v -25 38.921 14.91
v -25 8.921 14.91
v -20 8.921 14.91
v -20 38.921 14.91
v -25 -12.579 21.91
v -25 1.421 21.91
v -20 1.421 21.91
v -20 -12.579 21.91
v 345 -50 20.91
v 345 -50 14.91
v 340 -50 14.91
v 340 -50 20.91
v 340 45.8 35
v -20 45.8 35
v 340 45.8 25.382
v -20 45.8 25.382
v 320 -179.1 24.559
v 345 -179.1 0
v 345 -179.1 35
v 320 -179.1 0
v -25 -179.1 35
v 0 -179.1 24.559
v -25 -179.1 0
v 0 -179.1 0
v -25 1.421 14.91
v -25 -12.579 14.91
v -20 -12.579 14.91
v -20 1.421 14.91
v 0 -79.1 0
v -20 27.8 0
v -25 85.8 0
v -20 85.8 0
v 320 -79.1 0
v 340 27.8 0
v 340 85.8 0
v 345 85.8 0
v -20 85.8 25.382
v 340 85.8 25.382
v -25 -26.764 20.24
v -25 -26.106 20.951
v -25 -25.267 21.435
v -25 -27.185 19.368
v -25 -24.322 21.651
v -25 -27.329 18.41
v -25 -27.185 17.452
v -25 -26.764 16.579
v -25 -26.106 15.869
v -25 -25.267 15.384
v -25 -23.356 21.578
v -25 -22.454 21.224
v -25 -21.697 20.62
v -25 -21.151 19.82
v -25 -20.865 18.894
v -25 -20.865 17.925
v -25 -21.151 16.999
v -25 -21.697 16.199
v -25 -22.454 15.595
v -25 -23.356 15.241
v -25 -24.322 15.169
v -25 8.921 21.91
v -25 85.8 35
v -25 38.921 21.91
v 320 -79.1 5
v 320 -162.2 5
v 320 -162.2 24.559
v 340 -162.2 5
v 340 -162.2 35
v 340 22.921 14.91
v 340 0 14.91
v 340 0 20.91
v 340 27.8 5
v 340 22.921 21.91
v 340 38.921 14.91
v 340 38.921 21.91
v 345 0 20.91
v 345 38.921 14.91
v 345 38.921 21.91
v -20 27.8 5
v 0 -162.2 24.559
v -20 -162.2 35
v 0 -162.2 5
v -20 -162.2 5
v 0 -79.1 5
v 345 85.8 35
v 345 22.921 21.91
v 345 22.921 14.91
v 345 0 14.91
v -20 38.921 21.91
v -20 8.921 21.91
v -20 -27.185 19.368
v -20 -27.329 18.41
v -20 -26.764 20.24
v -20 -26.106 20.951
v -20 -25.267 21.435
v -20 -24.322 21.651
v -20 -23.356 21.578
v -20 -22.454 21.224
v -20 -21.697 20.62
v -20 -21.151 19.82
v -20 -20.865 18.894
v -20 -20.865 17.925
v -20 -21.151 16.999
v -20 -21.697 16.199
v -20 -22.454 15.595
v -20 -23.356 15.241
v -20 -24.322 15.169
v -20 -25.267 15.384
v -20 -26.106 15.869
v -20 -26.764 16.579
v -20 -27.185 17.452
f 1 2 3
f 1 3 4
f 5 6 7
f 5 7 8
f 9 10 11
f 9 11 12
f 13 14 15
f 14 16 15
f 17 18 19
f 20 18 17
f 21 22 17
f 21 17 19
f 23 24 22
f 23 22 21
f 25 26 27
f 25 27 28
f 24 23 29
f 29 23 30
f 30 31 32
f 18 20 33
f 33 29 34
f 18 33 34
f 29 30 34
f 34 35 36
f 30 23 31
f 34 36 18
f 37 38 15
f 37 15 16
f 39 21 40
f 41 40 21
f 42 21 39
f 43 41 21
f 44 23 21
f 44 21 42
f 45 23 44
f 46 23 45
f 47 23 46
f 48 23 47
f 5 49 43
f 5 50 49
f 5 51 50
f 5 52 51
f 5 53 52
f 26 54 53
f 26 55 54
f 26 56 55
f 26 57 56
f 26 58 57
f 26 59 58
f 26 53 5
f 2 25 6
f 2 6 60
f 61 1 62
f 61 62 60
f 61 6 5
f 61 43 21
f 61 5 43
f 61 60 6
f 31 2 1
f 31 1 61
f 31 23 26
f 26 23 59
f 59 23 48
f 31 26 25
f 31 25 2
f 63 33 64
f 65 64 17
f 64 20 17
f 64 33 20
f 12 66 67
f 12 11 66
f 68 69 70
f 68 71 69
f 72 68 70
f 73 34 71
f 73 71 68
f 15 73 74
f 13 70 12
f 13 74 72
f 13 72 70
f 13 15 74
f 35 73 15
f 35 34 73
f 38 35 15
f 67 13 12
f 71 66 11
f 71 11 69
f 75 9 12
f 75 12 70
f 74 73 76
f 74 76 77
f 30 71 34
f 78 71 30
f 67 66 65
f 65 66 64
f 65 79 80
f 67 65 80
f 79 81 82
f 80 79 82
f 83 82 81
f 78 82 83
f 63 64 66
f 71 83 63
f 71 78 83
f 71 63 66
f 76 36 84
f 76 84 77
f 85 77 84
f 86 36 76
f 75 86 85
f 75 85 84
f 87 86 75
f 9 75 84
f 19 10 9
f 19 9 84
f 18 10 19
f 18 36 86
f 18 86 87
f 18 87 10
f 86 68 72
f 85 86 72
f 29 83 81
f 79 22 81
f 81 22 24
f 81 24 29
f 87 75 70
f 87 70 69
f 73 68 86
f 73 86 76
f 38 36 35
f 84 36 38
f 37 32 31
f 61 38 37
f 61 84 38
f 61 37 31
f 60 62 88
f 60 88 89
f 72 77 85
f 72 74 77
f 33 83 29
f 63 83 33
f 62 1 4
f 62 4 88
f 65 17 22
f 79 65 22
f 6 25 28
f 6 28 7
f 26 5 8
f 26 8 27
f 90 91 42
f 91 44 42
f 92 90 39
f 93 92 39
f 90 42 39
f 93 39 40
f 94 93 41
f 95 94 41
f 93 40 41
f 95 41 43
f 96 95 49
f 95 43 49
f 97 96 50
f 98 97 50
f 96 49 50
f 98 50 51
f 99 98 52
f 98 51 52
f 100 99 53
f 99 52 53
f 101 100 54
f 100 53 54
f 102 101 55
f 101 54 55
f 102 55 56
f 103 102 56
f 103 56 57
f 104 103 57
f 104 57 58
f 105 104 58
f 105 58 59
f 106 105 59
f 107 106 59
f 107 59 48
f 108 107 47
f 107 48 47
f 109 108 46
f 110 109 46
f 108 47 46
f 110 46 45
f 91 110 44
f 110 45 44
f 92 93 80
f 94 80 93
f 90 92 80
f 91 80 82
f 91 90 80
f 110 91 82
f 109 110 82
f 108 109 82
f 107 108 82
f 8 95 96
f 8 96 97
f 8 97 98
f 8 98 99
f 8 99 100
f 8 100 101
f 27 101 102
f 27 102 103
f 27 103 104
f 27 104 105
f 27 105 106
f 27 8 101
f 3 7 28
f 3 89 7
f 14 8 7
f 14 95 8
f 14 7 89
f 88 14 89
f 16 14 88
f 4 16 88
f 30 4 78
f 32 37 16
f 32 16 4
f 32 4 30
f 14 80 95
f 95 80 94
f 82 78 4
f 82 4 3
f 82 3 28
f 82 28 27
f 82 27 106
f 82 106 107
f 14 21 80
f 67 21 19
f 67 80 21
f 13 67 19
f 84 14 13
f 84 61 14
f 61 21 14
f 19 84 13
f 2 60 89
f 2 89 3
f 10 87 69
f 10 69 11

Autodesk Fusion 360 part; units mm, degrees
sketch "Szkic1" plane through (0, 0, 0) normal (0, 0, 1) x (1, 0, 0)
  line L0 (-25, 50.8) -> (345, 50.8)
  line L1 (345, 50.8) -> (345, -179.1)
  line L2 (345, -179.1) -> (-25, -179.1)
  line L3 (-25, -179.1) -> (-25, 50.8)
  line L4 (-20, 45.8) -> (340, 45.8)
  line L5 (340, 45.8) -> (340, -162.2)
  line L6 (340, -162.2) -> (-20, -162.2)
  line L7 (-20, -162.2) -> (-20, 45.8)
  line L8 (-10, -50) -> (330, -50)
  line L9 (330, -50) -> (330, -160)
  line L10 (330, -160) -> (-10, -160)
  line L11 (-10, -160) -> (-10, -50)
  dimension "d1" = 370
  dimension "d2" = 229.9
  dimension "d3" = 360
  dimension "d4" = 208
  dimension "d5" = 5
  dimension "d6" = 16.9
extrude "Wyciągnięcie proste1" add sketch "Szkic1" along normal blind 35 contours L0 L1 L2 L3
extrude "Wyciągnięcie proste2" add sketch "Szkic1" along normal blind 5 contours L4 L5 L6 L7 | L8 L9 L10 L11
sketch "Szkic2" plane through (-25, 0, 0) normal (-1, 0, 0) x (0, -1, 0)
  line L0 (-50.8, 0) -> (179.1, 0)
  line L1 (179.1, 0) -> (179.1, 35)
  line L2 (179.1, 35) -> (-50.8, 35)
  line L3 (-50.8, 35) -> (-50.8, 0)
  line L4 (-22.9208, 21.9096) -> (-8.9208, 21.9096)
  line L5 (-8.9208, 21.9096) -> (-8.9208, 14.9096)
  line L6 (-8.9208, 14.9096) -> (-22.9208, 14.9096)
  line L7 (-22.9208, 14.9096) -> (-22.9208, 21.9096)
  line L8 (-38.9208, 21.9096) -> (-8.9208, 21.9096)
  line L9 (-8.9208, 21.9096) -> (-8.9208, 14.9096)
  line L10 (-8.9208, 14.9096) -> (-38.9208, 14.9096)
  line L11 (-38.9208, 14.9096) -> (-38.9208, 21.9096)
  line L12 (-1.4208, 21.9096) -> (12.5792, 21.9096)
  line L13 (12.5792, 21.9096) -> (12.5792, 14.9096)
  line L14 (12.5792, 14.9096) -> (-1.4208, 14.9096)
  line L15 (-1.4208, 14.9096) -> (-1.4208, 21.9096)
  circle A0 centre (24.0792, 18.4096) radius 3.25
  dimension "d11" = 14
  dimension "d12" = 7
  dimension "d13" = 30
  dimension "d14" = 7
  dimension "d15" = 14
  dimension "d16" = 7
  dimension "d17" = 7.5
  dimension "d18" = 6.5
  dimension "d19" = 11.5
extrude "Wyciągnięcie proste3" cut sketch "Szkic2" against normal blind 3 contours L4 L5 L6 L7 L8 L9 L10 | L12 L13 L14 L15 | A0
extrude "Wyciągnięcie proste4" cut 3 faces at (-22, 18.2542, 17.2429) (-22, -3.2458, 19.5763) (-22, -23.249, 17.192) along direction (1, 0, 0) blind 2
sketch "Szkic3" plane through (345, 0, 0) normal (1, 0, 0) x (0, 1, 0)
  line L0 (-179.1, 0) -> (50.8, 0)
  line L1 (50.8, 0) -> (50.8, 35)
  line L2 (50.8, 35) -> (-179.1, 35)
  line L3 (-179.1, 35) -> (-179.1, 0)
  line L4 (-50, 20.91) -> (0, 20.91)
  line L5 (0, 20.91) -> (0, 14.91)
  line L6 (0, 14.91) -> (-50, 14.91)
  line L7 (-50, 14.91) -> (-50, 20.91)
  line L8 (50.8, 0) -> (-179.1, 0)
  dimension "d24" = 50
  dimension "d25" = 6
  dimension "d26" = 14.91
extrude "Wyciągnięcie proste5" cut sketch "Szkic3" against normal blind 50 contours L4 L5 L6 L7
extrude "Wyciągnięcie proste6" cut sketch "Szkic2" against normal blind 450 contours L7 L8 L10 L11
sketch "Szkic4" plane through (0, -179.1, 0) normal (0, -1, 0) x (1, 0, 0)
  line L0 (-25, 0) -> (345, 0)
  line L1 (345, 0) -> (345, 35)
  line L2 (345, 35) -> (-25, 35)
  line L3 (-25, 35) -> (-25, 0)
  line L4 (0, 0) -> (320, 0)
  line L5 (320, 0) -> (320, 24.5591)
  line L6 (320, 24.5591) -> (0, 24.5591)
  line L7 (0, 24.5591) -> (0, 0)
  dimension "d31" = 320
  dimension "d32" = 25
extrude "Wyciągnięcie proste7" cut sketch "Szkic4" against normal blind 100 contours L0 L4 L5 L6 L7
extrude "Wyciągnięcie proste8" cut sketch "Szkic4" against normal blind 120 contours L0 L4 L5 L6 L7
extrude "Wyciągnięcie proste9" add sketch "Szkic1" along normal blind 5 contours L8 L9 L10 L11
extrude "Wyciągnięcie proste10" cut sketch "Szkic4" against normal blind 100 contours L0 L4 L5 L6 L7
sketch "Szkic5" plane through (0, 50.8, 0) normal (0, 1, 0) x (-1, 0, 0)
  line L0 (-345, 0) -> (25, 0)
  line L1 (25, 0) -> (25, 35)
  line L2 (25, 35) -> (-345, 35)
  line L3 (-345, 35) -> (-345, 0)
  line L4 (-345, 25.3824) -> (25, 25.3824)
  line L5 (25, 25.3824) -> (25, 0)
  line L6 (25, 0) -> (-345, 0)
  line L7 (-345, 0) -> (-345, 25.3824)
  line L8 (-340, 25.3824) -> (20, 25.3824)
  line L9 (20, 25.3824) -> (20, 0)
  line L10 (20, 0) -> (-340, 0)
  line L11 (-340, 0) -> (-340, 25.3824)
  dimension "d41" = 360
  dimension "d42" = 5
extrude "Wyciągnięcie proste11" add sketch "Szkic5" along normal blind 15 contours L0 L4 L6 L8 L9 L10 L11
extrude "Wyciągnięcie proste12" cut 1 faces at (220, 65.8, 16.9216) along direction (0, -1, 0) blind 18
extrude "Wyciągnięcie proste13" cut 1 faces at (220, 47.8, 16.9216) along direction (0, -1, 0) blind 20
extrude "Wyciągnięcie proste14" add sketch "Szkic5" along normal blind 35 contours L0 L3 L4 L6 L7 L11 | L1 L2 L3 L4 L8 | L0 L1 L4 L5 L6 L9
equation "d22 = 0 mm - 2.00 mm"
